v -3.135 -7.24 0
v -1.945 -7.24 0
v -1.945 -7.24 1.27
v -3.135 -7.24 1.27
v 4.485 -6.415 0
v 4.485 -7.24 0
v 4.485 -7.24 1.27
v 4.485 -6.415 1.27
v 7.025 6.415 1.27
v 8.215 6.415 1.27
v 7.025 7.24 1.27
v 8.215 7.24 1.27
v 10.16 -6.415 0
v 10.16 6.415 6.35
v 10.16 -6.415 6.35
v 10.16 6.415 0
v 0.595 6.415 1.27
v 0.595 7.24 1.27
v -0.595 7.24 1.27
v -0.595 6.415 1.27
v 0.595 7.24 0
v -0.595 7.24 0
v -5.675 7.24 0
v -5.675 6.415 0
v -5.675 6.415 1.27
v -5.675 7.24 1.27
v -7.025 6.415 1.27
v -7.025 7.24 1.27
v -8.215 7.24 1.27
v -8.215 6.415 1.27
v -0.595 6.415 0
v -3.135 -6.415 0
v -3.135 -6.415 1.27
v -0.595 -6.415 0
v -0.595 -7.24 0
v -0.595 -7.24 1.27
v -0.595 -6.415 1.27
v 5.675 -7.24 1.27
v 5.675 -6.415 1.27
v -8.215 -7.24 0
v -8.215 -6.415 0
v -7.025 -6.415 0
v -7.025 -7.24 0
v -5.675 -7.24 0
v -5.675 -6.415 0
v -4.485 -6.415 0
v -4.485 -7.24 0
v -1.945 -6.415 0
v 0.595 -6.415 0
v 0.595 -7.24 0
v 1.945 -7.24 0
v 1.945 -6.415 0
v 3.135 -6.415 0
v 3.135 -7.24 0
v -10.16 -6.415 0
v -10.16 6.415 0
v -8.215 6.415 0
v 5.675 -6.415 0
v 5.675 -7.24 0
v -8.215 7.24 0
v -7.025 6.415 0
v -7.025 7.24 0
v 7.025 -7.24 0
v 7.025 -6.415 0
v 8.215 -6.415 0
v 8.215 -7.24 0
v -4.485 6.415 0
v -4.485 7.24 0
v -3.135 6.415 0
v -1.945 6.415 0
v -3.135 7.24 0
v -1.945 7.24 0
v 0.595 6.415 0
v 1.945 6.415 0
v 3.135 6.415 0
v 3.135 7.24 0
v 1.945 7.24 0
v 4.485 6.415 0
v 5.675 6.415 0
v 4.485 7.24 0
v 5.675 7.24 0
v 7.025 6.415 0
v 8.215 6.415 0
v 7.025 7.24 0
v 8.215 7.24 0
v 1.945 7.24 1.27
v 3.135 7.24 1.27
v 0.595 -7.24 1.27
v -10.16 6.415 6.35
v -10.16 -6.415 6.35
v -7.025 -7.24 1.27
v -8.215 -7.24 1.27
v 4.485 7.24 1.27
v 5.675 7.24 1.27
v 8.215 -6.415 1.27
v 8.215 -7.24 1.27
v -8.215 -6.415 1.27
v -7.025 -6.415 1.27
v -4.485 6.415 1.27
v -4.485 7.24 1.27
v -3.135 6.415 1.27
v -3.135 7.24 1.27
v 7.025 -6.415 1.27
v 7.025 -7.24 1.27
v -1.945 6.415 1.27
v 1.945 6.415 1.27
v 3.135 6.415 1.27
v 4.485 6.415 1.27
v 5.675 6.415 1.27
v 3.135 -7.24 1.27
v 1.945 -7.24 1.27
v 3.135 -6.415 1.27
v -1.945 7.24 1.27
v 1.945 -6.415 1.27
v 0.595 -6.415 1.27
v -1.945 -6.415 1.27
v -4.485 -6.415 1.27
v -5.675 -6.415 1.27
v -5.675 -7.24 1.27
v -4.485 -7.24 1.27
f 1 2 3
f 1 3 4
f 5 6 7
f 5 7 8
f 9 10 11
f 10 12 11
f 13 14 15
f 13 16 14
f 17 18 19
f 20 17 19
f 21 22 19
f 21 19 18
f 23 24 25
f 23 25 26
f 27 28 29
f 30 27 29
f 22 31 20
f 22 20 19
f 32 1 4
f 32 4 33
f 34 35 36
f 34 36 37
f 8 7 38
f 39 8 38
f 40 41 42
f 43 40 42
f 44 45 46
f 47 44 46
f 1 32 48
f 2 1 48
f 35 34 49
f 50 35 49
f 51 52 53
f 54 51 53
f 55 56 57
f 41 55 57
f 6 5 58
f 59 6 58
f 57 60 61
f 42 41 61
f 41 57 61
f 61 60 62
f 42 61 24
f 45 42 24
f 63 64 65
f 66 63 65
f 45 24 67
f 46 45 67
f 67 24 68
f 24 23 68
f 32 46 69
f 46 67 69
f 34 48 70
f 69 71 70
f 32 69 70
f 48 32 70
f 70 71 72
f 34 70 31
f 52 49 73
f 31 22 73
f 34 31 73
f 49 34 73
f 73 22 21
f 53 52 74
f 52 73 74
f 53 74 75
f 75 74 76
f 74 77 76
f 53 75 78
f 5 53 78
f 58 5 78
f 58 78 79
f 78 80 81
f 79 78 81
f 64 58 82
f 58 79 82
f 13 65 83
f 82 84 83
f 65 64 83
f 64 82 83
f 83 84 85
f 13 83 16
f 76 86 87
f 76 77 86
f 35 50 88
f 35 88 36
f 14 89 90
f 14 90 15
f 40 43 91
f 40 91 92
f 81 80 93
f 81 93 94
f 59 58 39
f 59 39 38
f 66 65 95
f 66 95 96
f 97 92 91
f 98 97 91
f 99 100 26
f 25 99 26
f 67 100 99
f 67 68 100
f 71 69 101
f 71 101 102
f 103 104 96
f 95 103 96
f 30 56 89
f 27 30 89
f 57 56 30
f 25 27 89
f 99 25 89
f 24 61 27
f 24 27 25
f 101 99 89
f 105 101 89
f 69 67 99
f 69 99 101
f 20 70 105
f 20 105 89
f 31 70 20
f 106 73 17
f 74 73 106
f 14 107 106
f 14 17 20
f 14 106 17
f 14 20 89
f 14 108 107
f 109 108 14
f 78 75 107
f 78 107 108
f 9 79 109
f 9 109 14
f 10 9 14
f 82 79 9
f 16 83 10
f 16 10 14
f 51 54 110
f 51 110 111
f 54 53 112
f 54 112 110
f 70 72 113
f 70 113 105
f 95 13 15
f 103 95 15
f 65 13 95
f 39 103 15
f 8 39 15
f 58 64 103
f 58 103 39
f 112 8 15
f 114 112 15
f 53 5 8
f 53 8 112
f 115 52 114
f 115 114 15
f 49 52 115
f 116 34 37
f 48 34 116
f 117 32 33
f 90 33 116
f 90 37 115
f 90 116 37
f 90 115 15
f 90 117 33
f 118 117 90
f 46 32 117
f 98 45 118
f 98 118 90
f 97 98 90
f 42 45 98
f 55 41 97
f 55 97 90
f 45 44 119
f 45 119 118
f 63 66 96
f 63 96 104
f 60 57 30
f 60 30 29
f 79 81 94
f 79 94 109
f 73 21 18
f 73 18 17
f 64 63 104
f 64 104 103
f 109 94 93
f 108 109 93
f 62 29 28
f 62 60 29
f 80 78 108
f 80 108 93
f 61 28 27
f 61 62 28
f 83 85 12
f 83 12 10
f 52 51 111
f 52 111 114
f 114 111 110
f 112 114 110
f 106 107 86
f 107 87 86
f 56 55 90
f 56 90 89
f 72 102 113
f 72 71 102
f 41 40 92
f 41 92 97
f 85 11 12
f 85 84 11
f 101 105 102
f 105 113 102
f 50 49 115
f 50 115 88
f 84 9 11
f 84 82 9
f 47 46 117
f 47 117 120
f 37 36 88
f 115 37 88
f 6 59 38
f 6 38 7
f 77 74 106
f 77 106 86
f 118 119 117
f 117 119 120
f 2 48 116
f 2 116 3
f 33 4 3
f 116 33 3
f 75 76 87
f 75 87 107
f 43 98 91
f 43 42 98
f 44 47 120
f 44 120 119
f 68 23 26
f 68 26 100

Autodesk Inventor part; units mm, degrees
ref_plane "YZ Plane" through (0, 0, 0) normal (1, 0, 0) x (0, 1, 0)
ref_plane "XZ Plane" through (0, 0, 0) normal (0, 1, 0) x (-1, 0, 0)
ref_plane "XY Plane" through (0, 0, 0) normal (0, 0, 1) x (1, 0, 0)
sketch "Sketch1" plane through (0, 0, 0) normal (0, 0, 1) x (1, 0, 0)
  line L0 (-10.16, 6.415) -> (10.16, 6.415)
  line L1 (10.16, 6.415) -> (10.16, -6.415)
  line L2 (10.16, -6.415) -> (-10.16, -6.415)
  line L3 (-10.16, -6.415) -> (-10.16, 6.415)
  point P0 (0, 0)
  dimension "d0" = 20.32
  dimension "d1" = 10.16
  dimension "d2" = 12.83
  dimension "d3" = 6.415
extrude "Extrusion1" add sketch "Sketch1" along normal blind 6.35
sketch "Sketch2" plane through (0, 0, 0) normal (0, 0, -1) x (-1, 0, 0)
  line L0 (8.215, 7.24) -> (7.025, 7.24)
  line L1 (7.025, 7.24) -> (7.025, 5.59)
  line L2 (7.025, 5.59) -> (8.215, 5.59)
  line L3 (8.215, 5.59) -> (8.215, 7.24)
  line L4 (10.16, 6.415) -> (-10.16, 6.415) projected
  line L5 (10.16, -6.415) -> (10.16, 6.415) projected
  point P0 (0, 0)
  dimension "d6" = 1.65
  dimension "d7" = 0.825
  dimension "d8" = 1.19
  dimension "d9" = 1.945
extrude "Extrusion2" add sketch "Sketch2" against normal blind 1.27
pattern_linear "Rectangular Pattern1" count 7 spacing 2.54 along (1, 0, 0) of "Extrusion2"
mirror "Mirror1" about plane through (0, 0, 0) normal (0, 1, 0) of "Extrusion2", "Rectangular Pattern1"
properties part number "MC_BK377"
